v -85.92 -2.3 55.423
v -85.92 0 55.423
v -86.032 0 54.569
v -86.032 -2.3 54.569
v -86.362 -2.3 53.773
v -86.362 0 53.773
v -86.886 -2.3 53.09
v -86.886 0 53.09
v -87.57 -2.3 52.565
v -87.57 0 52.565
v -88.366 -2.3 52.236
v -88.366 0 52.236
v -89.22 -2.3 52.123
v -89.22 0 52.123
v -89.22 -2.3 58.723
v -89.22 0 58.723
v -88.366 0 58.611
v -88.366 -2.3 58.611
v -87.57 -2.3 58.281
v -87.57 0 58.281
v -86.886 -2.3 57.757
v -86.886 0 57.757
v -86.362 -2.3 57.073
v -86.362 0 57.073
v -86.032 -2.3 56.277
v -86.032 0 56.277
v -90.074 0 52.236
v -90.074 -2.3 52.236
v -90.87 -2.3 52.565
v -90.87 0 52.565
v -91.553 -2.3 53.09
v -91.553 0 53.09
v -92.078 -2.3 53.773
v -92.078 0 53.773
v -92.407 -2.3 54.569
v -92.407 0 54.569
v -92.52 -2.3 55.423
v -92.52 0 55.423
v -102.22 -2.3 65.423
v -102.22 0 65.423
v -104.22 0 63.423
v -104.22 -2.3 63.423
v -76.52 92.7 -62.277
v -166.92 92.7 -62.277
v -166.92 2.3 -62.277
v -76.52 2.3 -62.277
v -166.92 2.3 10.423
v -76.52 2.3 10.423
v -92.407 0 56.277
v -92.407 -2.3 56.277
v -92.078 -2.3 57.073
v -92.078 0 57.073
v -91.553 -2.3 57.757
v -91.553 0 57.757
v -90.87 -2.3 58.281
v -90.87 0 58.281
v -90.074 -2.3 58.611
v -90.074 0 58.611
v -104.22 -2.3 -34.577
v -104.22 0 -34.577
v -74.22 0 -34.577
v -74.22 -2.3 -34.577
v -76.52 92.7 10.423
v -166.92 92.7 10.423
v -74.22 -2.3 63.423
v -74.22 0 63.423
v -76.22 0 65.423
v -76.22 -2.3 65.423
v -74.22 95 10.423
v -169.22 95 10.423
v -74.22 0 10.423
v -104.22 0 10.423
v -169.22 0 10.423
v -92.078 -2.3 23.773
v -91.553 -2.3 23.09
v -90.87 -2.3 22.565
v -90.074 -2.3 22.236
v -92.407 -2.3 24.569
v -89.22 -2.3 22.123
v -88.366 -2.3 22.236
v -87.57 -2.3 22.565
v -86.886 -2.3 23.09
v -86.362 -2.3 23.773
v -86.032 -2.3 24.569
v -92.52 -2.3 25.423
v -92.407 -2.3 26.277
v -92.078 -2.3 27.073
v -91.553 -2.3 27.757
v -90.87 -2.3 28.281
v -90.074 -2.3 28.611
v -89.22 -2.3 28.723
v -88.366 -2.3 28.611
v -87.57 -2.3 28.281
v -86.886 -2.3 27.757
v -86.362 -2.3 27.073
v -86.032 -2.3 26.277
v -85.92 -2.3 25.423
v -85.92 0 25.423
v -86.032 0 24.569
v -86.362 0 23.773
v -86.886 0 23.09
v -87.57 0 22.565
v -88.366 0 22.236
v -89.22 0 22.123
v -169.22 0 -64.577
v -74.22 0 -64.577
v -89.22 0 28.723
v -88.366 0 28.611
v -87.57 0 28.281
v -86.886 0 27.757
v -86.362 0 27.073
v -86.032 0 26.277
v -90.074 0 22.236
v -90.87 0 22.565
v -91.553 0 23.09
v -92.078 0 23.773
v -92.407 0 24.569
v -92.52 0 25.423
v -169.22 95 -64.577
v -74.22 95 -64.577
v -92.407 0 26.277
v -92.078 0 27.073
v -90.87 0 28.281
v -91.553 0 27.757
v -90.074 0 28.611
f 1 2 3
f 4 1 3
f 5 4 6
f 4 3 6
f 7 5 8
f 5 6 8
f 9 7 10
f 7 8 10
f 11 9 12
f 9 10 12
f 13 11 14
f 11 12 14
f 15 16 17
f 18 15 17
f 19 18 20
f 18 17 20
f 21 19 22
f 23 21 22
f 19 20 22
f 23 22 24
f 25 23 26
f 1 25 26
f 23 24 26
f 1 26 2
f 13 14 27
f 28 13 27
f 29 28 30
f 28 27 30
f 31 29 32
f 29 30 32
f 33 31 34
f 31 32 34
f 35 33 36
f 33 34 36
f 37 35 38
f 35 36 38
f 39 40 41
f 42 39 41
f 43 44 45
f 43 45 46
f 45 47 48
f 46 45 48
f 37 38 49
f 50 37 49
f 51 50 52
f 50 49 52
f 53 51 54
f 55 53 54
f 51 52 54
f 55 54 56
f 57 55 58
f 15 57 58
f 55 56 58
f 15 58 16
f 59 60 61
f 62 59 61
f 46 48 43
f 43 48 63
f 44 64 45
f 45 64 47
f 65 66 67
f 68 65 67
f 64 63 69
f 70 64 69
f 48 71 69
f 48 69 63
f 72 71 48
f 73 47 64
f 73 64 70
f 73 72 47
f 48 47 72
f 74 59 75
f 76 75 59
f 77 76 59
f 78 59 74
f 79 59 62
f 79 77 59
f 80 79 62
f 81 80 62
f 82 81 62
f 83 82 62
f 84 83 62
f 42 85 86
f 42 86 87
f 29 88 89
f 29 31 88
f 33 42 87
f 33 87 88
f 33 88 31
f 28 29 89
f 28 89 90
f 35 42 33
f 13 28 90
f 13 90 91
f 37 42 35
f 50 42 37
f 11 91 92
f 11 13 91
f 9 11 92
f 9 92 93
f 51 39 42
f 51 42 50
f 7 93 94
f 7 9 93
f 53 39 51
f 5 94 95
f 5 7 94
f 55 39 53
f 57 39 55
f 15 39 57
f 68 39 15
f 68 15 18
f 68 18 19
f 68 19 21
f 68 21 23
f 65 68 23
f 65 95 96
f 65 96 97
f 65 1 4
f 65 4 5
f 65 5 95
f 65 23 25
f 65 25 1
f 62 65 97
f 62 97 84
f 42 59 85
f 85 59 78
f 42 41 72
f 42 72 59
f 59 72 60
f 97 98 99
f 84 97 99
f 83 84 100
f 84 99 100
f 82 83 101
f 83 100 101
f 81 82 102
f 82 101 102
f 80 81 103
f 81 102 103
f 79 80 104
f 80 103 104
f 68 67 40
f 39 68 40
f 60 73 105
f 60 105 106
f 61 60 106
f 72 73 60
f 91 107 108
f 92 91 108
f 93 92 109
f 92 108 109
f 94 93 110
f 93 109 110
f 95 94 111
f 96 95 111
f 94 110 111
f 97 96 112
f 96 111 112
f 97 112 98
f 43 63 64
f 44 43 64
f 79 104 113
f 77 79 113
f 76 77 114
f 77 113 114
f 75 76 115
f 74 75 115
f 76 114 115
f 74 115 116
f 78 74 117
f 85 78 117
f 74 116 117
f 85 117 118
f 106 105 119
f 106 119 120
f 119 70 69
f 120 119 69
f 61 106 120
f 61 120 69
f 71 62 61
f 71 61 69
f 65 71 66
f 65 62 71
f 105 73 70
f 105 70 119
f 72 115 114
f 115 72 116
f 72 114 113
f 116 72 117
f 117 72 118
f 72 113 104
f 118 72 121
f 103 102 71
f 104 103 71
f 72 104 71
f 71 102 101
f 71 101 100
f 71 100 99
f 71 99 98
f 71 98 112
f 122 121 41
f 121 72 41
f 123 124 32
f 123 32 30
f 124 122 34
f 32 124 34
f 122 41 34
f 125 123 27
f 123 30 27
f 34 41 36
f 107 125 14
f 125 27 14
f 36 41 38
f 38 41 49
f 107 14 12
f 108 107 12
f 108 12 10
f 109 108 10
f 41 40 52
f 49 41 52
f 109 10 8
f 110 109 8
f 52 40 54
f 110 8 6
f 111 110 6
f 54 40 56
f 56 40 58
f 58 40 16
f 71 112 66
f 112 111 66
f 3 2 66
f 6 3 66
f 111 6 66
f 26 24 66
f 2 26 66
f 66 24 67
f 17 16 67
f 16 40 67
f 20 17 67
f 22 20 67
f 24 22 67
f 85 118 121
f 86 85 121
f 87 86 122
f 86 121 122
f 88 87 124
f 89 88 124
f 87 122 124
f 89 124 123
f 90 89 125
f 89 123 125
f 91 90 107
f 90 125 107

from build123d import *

# Parameters (mm, degrees)
F0_W     = 27.7
F0_H     = 45
F0_W_2   = 2.3
F1_DEPTH = 2.3
F2_DEPTH = 95
F4_DEPTH = 72.7


with BuildPart() as f1:
    # F0 (on Front) → F1 (new body)
    with BuildSketch(Plane.XZ):
        with Locations((-90.369921, -12.07692)):
            Rectangle(F0_W, F0_H)
        Polygon((-76.519921, 10.42308), (-74.219921, 10.42308), (-74.219921, 63.42308), (-76.219921, 65.42308), (-102.219921, 65.42308), (-104.219921, 63.42308), (-104.219921, 10.42308), align=None)
        with BuildLine():
            ThreePointArc((-89.219921, 22.12308), (-91.553373, 23.089628), (-92.519921, 25.42308))
            ThreePointArc((-92.519921, 25.42308), (-91.553373, 27.756532), (-89.219921, 28.72308))
            ThreePointArc((-89.219921, 28.72308), (-86.886469, 27.756532), (-85.919921, 25.42308))
            ThreePointArc((-85.919921, 25.42308), (-86.886469, 23.089628), (-89.219921, 22.12308))
        make_face(mode=Mode.SUBTRACT)
        with BuildLine():
            ThreePointArc((-89.219921, 52.12308), (-91.553373, 53.089628), (-92.519921, 55.42308))
            ThreePointArc((-92.519921, 55.42308), (-91.553373, 57.756532), (-89.219921, 58.72308))
            ThreePointArc((-89.219921, 58.72308), (-86.886469, 57.756532), (-85.919921, 55.42308))
            ThreePointArc((-85.919921, 55.42308), (-86.886469, 53.089628), (-89.219921, 52.12308))
        make_face(mode=Mode.SUBTRACT)
        with Locations((-75.369921, -12.07692)):
            Rectangle(F0_W_2, F0_H)
    extrude(amount=F1_DEPTH)

    # F0 (on Front) → F2 (join)
    with BuildSketch(Plane.XZ):
        Polygon((-76.519921, -62.27692), (-76.519921, -34.57692), (-104.219921, -34.57692), (-104.219921, 10.42308), (-166.919921, 10.42308), (-166.919921, -62.27692), align=None)
        Polygon((-169.219921, -64.57692), (-74.219921, -64.57692), (-74.219921, -34.57692), (-76.519921, -34.57692), (-76.519921, -62.27692), (-166.919921, -62.27692), (-166.919921, 10.42308), (-169.219921, 10.42308), align=None)
        with Locations((-90.369921, -12.07692)):
            Rectangle(F0_W, F0_H)
        with Locations((-75.369921, -12.07692)):
            Rectangle(F0_W_2, F0_H)
    extrude(amount=-F2_DEPTH)

    # F3 (on face) → F4 (cut)
    with BuildSketch(Plane.XY.offset(10.42308)):
        Polygon((-104.219921, 2.3), (-76.519921, 2.3), (-76.519921, 92.7), (-166.919921, 92.7), (-166.919921, 2.3), align=None)
    extrude(amount=-F4_DEPTH, mode=Mode.SUBTRACT)


solid = f1.part
